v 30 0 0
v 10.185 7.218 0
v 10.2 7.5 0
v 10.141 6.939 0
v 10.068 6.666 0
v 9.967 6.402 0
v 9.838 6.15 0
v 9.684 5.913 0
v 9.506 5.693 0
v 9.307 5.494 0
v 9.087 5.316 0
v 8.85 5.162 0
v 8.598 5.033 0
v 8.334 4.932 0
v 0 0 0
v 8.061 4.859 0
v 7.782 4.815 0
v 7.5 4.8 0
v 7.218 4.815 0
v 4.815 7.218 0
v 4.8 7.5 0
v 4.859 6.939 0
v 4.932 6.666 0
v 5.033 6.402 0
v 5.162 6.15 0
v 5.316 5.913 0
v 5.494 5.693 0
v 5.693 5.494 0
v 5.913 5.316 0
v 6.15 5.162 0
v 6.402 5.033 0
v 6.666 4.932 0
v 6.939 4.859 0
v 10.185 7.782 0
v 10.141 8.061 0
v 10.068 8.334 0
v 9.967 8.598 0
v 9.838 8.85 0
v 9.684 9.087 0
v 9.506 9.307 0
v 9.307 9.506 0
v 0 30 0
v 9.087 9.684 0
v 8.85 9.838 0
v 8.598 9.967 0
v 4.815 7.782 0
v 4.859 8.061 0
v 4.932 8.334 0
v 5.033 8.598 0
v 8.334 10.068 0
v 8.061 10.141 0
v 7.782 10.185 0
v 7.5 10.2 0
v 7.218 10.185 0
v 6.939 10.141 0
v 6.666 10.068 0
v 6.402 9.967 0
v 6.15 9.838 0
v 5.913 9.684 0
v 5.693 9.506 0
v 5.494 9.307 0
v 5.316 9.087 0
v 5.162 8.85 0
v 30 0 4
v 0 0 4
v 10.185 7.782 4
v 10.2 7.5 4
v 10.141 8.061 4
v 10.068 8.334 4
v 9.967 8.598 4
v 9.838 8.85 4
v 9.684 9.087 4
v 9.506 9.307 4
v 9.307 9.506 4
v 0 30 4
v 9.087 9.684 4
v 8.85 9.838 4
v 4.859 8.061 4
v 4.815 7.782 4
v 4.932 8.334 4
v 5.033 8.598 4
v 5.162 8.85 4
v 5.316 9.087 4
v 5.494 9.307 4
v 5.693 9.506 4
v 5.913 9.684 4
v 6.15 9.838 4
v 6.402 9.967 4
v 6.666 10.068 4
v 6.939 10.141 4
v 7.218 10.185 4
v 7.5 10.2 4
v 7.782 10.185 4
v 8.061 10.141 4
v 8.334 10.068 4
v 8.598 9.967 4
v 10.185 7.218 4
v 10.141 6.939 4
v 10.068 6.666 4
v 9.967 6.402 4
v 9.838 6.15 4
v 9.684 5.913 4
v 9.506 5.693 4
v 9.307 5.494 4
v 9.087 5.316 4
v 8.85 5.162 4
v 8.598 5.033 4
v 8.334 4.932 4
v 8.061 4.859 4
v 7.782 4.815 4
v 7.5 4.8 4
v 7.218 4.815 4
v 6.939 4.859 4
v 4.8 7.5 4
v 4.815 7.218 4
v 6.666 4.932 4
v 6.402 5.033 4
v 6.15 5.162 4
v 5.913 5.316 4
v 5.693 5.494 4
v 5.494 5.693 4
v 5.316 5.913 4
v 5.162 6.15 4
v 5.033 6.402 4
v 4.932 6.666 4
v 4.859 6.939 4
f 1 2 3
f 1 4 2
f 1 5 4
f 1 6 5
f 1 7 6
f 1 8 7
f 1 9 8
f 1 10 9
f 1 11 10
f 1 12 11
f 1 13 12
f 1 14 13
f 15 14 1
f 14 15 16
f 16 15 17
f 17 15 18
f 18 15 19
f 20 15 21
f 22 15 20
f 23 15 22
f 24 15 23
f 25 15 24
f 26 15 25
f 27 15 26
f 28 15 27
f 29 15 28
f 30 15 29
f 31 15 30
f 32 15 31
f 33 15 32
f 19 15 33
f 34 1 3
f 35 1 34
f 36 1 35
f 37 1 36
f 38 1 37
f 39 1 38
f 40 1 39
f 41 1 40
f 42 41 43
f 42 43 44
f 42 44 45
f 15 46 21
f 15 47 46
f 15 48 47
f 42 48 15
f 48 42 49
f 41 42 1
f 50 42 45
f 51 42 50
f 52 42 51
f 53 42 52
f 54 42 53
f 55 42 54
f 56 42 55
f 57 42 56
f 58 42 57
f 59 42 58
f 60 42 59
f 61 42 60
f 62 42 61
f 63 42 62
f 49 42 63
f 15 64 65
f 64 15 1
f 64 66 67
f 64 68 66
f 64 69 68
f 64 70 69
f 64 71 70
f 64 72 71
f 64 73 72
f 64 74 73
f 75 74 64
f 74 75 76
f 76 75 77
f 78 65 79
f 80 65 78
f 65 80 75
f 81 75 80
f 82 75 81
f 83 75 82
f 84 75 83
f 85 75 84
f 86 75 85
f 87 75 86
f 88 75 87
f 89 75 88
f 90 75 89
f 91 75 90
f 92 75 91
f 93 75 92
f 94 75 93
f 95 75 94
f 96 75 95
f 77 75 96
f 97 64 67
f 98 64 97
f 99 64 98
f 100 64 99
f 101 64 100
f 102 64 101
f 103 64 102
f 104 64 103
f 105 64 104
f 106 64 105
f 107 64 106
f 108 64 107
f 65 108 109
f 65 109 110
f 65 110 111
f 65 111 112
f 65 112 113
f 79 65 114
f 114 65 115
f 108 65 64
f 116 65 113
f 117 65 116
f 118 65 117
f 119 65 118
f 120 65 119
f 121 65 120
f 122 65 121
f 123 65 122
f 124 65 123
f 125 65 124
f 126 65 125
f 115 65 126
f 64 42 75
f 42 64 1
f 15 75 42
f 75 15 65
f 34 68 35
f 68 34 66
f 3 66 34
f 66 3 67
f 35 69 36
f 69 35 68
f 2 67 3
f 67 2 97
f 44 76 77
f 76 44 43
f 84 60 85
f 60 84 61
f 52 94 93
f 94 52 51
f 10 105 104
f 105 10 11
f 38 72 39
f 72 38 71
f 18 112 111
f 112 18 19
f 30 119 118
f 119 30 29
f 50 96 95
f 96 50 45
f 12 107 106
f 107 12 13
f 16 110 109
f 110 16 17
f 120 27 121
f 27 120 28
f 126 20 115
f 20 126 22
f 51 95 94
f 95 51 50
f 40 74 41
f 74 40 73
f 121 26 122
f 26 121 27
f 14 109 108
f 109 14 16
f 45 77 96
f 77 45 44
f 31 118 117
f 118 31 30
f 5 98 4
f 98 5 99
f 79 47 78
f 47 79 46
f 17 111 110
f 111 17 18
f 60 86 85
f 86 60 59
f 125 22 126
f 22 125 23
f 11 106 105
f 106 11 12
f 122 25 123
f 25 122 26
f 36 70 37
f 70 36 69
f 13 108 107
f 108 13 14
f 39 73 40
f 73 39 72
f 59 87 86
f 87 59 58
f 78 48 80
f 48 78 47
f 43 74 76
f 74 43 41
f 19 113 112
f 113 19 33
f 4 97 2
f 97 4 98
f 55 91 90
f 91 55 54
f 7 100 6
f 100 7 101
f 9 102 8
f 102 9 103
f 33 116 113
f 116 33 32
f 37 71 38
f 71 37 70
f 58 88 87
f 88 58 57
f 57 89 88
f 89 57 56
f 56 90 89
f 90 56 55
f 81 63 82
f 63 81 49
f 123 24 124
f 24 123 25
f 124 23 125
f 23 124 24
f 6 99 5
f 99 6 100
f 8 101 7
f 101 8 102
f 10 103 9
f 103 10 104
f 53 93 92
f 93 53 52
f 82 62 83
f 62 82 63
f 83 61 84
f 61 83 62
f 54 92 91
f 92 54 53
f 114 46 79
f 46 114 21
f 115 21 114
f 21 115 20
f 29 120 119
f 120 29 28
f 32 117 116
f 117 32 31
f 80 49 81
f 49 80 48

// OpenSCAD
// Triangular reinforcement gusset.
$fn = 60;
eps = 0.02;
leg = 30;
thickness = 4;
difference() {
    linear_extrude(height=thickness) polygon(points=[[0,0],[leg,0],[0,leg]]);
    translate([leg*0.25,leg*0.25,-eps]) cylinder(d=5.4,h=thickness+2*eps);
}
